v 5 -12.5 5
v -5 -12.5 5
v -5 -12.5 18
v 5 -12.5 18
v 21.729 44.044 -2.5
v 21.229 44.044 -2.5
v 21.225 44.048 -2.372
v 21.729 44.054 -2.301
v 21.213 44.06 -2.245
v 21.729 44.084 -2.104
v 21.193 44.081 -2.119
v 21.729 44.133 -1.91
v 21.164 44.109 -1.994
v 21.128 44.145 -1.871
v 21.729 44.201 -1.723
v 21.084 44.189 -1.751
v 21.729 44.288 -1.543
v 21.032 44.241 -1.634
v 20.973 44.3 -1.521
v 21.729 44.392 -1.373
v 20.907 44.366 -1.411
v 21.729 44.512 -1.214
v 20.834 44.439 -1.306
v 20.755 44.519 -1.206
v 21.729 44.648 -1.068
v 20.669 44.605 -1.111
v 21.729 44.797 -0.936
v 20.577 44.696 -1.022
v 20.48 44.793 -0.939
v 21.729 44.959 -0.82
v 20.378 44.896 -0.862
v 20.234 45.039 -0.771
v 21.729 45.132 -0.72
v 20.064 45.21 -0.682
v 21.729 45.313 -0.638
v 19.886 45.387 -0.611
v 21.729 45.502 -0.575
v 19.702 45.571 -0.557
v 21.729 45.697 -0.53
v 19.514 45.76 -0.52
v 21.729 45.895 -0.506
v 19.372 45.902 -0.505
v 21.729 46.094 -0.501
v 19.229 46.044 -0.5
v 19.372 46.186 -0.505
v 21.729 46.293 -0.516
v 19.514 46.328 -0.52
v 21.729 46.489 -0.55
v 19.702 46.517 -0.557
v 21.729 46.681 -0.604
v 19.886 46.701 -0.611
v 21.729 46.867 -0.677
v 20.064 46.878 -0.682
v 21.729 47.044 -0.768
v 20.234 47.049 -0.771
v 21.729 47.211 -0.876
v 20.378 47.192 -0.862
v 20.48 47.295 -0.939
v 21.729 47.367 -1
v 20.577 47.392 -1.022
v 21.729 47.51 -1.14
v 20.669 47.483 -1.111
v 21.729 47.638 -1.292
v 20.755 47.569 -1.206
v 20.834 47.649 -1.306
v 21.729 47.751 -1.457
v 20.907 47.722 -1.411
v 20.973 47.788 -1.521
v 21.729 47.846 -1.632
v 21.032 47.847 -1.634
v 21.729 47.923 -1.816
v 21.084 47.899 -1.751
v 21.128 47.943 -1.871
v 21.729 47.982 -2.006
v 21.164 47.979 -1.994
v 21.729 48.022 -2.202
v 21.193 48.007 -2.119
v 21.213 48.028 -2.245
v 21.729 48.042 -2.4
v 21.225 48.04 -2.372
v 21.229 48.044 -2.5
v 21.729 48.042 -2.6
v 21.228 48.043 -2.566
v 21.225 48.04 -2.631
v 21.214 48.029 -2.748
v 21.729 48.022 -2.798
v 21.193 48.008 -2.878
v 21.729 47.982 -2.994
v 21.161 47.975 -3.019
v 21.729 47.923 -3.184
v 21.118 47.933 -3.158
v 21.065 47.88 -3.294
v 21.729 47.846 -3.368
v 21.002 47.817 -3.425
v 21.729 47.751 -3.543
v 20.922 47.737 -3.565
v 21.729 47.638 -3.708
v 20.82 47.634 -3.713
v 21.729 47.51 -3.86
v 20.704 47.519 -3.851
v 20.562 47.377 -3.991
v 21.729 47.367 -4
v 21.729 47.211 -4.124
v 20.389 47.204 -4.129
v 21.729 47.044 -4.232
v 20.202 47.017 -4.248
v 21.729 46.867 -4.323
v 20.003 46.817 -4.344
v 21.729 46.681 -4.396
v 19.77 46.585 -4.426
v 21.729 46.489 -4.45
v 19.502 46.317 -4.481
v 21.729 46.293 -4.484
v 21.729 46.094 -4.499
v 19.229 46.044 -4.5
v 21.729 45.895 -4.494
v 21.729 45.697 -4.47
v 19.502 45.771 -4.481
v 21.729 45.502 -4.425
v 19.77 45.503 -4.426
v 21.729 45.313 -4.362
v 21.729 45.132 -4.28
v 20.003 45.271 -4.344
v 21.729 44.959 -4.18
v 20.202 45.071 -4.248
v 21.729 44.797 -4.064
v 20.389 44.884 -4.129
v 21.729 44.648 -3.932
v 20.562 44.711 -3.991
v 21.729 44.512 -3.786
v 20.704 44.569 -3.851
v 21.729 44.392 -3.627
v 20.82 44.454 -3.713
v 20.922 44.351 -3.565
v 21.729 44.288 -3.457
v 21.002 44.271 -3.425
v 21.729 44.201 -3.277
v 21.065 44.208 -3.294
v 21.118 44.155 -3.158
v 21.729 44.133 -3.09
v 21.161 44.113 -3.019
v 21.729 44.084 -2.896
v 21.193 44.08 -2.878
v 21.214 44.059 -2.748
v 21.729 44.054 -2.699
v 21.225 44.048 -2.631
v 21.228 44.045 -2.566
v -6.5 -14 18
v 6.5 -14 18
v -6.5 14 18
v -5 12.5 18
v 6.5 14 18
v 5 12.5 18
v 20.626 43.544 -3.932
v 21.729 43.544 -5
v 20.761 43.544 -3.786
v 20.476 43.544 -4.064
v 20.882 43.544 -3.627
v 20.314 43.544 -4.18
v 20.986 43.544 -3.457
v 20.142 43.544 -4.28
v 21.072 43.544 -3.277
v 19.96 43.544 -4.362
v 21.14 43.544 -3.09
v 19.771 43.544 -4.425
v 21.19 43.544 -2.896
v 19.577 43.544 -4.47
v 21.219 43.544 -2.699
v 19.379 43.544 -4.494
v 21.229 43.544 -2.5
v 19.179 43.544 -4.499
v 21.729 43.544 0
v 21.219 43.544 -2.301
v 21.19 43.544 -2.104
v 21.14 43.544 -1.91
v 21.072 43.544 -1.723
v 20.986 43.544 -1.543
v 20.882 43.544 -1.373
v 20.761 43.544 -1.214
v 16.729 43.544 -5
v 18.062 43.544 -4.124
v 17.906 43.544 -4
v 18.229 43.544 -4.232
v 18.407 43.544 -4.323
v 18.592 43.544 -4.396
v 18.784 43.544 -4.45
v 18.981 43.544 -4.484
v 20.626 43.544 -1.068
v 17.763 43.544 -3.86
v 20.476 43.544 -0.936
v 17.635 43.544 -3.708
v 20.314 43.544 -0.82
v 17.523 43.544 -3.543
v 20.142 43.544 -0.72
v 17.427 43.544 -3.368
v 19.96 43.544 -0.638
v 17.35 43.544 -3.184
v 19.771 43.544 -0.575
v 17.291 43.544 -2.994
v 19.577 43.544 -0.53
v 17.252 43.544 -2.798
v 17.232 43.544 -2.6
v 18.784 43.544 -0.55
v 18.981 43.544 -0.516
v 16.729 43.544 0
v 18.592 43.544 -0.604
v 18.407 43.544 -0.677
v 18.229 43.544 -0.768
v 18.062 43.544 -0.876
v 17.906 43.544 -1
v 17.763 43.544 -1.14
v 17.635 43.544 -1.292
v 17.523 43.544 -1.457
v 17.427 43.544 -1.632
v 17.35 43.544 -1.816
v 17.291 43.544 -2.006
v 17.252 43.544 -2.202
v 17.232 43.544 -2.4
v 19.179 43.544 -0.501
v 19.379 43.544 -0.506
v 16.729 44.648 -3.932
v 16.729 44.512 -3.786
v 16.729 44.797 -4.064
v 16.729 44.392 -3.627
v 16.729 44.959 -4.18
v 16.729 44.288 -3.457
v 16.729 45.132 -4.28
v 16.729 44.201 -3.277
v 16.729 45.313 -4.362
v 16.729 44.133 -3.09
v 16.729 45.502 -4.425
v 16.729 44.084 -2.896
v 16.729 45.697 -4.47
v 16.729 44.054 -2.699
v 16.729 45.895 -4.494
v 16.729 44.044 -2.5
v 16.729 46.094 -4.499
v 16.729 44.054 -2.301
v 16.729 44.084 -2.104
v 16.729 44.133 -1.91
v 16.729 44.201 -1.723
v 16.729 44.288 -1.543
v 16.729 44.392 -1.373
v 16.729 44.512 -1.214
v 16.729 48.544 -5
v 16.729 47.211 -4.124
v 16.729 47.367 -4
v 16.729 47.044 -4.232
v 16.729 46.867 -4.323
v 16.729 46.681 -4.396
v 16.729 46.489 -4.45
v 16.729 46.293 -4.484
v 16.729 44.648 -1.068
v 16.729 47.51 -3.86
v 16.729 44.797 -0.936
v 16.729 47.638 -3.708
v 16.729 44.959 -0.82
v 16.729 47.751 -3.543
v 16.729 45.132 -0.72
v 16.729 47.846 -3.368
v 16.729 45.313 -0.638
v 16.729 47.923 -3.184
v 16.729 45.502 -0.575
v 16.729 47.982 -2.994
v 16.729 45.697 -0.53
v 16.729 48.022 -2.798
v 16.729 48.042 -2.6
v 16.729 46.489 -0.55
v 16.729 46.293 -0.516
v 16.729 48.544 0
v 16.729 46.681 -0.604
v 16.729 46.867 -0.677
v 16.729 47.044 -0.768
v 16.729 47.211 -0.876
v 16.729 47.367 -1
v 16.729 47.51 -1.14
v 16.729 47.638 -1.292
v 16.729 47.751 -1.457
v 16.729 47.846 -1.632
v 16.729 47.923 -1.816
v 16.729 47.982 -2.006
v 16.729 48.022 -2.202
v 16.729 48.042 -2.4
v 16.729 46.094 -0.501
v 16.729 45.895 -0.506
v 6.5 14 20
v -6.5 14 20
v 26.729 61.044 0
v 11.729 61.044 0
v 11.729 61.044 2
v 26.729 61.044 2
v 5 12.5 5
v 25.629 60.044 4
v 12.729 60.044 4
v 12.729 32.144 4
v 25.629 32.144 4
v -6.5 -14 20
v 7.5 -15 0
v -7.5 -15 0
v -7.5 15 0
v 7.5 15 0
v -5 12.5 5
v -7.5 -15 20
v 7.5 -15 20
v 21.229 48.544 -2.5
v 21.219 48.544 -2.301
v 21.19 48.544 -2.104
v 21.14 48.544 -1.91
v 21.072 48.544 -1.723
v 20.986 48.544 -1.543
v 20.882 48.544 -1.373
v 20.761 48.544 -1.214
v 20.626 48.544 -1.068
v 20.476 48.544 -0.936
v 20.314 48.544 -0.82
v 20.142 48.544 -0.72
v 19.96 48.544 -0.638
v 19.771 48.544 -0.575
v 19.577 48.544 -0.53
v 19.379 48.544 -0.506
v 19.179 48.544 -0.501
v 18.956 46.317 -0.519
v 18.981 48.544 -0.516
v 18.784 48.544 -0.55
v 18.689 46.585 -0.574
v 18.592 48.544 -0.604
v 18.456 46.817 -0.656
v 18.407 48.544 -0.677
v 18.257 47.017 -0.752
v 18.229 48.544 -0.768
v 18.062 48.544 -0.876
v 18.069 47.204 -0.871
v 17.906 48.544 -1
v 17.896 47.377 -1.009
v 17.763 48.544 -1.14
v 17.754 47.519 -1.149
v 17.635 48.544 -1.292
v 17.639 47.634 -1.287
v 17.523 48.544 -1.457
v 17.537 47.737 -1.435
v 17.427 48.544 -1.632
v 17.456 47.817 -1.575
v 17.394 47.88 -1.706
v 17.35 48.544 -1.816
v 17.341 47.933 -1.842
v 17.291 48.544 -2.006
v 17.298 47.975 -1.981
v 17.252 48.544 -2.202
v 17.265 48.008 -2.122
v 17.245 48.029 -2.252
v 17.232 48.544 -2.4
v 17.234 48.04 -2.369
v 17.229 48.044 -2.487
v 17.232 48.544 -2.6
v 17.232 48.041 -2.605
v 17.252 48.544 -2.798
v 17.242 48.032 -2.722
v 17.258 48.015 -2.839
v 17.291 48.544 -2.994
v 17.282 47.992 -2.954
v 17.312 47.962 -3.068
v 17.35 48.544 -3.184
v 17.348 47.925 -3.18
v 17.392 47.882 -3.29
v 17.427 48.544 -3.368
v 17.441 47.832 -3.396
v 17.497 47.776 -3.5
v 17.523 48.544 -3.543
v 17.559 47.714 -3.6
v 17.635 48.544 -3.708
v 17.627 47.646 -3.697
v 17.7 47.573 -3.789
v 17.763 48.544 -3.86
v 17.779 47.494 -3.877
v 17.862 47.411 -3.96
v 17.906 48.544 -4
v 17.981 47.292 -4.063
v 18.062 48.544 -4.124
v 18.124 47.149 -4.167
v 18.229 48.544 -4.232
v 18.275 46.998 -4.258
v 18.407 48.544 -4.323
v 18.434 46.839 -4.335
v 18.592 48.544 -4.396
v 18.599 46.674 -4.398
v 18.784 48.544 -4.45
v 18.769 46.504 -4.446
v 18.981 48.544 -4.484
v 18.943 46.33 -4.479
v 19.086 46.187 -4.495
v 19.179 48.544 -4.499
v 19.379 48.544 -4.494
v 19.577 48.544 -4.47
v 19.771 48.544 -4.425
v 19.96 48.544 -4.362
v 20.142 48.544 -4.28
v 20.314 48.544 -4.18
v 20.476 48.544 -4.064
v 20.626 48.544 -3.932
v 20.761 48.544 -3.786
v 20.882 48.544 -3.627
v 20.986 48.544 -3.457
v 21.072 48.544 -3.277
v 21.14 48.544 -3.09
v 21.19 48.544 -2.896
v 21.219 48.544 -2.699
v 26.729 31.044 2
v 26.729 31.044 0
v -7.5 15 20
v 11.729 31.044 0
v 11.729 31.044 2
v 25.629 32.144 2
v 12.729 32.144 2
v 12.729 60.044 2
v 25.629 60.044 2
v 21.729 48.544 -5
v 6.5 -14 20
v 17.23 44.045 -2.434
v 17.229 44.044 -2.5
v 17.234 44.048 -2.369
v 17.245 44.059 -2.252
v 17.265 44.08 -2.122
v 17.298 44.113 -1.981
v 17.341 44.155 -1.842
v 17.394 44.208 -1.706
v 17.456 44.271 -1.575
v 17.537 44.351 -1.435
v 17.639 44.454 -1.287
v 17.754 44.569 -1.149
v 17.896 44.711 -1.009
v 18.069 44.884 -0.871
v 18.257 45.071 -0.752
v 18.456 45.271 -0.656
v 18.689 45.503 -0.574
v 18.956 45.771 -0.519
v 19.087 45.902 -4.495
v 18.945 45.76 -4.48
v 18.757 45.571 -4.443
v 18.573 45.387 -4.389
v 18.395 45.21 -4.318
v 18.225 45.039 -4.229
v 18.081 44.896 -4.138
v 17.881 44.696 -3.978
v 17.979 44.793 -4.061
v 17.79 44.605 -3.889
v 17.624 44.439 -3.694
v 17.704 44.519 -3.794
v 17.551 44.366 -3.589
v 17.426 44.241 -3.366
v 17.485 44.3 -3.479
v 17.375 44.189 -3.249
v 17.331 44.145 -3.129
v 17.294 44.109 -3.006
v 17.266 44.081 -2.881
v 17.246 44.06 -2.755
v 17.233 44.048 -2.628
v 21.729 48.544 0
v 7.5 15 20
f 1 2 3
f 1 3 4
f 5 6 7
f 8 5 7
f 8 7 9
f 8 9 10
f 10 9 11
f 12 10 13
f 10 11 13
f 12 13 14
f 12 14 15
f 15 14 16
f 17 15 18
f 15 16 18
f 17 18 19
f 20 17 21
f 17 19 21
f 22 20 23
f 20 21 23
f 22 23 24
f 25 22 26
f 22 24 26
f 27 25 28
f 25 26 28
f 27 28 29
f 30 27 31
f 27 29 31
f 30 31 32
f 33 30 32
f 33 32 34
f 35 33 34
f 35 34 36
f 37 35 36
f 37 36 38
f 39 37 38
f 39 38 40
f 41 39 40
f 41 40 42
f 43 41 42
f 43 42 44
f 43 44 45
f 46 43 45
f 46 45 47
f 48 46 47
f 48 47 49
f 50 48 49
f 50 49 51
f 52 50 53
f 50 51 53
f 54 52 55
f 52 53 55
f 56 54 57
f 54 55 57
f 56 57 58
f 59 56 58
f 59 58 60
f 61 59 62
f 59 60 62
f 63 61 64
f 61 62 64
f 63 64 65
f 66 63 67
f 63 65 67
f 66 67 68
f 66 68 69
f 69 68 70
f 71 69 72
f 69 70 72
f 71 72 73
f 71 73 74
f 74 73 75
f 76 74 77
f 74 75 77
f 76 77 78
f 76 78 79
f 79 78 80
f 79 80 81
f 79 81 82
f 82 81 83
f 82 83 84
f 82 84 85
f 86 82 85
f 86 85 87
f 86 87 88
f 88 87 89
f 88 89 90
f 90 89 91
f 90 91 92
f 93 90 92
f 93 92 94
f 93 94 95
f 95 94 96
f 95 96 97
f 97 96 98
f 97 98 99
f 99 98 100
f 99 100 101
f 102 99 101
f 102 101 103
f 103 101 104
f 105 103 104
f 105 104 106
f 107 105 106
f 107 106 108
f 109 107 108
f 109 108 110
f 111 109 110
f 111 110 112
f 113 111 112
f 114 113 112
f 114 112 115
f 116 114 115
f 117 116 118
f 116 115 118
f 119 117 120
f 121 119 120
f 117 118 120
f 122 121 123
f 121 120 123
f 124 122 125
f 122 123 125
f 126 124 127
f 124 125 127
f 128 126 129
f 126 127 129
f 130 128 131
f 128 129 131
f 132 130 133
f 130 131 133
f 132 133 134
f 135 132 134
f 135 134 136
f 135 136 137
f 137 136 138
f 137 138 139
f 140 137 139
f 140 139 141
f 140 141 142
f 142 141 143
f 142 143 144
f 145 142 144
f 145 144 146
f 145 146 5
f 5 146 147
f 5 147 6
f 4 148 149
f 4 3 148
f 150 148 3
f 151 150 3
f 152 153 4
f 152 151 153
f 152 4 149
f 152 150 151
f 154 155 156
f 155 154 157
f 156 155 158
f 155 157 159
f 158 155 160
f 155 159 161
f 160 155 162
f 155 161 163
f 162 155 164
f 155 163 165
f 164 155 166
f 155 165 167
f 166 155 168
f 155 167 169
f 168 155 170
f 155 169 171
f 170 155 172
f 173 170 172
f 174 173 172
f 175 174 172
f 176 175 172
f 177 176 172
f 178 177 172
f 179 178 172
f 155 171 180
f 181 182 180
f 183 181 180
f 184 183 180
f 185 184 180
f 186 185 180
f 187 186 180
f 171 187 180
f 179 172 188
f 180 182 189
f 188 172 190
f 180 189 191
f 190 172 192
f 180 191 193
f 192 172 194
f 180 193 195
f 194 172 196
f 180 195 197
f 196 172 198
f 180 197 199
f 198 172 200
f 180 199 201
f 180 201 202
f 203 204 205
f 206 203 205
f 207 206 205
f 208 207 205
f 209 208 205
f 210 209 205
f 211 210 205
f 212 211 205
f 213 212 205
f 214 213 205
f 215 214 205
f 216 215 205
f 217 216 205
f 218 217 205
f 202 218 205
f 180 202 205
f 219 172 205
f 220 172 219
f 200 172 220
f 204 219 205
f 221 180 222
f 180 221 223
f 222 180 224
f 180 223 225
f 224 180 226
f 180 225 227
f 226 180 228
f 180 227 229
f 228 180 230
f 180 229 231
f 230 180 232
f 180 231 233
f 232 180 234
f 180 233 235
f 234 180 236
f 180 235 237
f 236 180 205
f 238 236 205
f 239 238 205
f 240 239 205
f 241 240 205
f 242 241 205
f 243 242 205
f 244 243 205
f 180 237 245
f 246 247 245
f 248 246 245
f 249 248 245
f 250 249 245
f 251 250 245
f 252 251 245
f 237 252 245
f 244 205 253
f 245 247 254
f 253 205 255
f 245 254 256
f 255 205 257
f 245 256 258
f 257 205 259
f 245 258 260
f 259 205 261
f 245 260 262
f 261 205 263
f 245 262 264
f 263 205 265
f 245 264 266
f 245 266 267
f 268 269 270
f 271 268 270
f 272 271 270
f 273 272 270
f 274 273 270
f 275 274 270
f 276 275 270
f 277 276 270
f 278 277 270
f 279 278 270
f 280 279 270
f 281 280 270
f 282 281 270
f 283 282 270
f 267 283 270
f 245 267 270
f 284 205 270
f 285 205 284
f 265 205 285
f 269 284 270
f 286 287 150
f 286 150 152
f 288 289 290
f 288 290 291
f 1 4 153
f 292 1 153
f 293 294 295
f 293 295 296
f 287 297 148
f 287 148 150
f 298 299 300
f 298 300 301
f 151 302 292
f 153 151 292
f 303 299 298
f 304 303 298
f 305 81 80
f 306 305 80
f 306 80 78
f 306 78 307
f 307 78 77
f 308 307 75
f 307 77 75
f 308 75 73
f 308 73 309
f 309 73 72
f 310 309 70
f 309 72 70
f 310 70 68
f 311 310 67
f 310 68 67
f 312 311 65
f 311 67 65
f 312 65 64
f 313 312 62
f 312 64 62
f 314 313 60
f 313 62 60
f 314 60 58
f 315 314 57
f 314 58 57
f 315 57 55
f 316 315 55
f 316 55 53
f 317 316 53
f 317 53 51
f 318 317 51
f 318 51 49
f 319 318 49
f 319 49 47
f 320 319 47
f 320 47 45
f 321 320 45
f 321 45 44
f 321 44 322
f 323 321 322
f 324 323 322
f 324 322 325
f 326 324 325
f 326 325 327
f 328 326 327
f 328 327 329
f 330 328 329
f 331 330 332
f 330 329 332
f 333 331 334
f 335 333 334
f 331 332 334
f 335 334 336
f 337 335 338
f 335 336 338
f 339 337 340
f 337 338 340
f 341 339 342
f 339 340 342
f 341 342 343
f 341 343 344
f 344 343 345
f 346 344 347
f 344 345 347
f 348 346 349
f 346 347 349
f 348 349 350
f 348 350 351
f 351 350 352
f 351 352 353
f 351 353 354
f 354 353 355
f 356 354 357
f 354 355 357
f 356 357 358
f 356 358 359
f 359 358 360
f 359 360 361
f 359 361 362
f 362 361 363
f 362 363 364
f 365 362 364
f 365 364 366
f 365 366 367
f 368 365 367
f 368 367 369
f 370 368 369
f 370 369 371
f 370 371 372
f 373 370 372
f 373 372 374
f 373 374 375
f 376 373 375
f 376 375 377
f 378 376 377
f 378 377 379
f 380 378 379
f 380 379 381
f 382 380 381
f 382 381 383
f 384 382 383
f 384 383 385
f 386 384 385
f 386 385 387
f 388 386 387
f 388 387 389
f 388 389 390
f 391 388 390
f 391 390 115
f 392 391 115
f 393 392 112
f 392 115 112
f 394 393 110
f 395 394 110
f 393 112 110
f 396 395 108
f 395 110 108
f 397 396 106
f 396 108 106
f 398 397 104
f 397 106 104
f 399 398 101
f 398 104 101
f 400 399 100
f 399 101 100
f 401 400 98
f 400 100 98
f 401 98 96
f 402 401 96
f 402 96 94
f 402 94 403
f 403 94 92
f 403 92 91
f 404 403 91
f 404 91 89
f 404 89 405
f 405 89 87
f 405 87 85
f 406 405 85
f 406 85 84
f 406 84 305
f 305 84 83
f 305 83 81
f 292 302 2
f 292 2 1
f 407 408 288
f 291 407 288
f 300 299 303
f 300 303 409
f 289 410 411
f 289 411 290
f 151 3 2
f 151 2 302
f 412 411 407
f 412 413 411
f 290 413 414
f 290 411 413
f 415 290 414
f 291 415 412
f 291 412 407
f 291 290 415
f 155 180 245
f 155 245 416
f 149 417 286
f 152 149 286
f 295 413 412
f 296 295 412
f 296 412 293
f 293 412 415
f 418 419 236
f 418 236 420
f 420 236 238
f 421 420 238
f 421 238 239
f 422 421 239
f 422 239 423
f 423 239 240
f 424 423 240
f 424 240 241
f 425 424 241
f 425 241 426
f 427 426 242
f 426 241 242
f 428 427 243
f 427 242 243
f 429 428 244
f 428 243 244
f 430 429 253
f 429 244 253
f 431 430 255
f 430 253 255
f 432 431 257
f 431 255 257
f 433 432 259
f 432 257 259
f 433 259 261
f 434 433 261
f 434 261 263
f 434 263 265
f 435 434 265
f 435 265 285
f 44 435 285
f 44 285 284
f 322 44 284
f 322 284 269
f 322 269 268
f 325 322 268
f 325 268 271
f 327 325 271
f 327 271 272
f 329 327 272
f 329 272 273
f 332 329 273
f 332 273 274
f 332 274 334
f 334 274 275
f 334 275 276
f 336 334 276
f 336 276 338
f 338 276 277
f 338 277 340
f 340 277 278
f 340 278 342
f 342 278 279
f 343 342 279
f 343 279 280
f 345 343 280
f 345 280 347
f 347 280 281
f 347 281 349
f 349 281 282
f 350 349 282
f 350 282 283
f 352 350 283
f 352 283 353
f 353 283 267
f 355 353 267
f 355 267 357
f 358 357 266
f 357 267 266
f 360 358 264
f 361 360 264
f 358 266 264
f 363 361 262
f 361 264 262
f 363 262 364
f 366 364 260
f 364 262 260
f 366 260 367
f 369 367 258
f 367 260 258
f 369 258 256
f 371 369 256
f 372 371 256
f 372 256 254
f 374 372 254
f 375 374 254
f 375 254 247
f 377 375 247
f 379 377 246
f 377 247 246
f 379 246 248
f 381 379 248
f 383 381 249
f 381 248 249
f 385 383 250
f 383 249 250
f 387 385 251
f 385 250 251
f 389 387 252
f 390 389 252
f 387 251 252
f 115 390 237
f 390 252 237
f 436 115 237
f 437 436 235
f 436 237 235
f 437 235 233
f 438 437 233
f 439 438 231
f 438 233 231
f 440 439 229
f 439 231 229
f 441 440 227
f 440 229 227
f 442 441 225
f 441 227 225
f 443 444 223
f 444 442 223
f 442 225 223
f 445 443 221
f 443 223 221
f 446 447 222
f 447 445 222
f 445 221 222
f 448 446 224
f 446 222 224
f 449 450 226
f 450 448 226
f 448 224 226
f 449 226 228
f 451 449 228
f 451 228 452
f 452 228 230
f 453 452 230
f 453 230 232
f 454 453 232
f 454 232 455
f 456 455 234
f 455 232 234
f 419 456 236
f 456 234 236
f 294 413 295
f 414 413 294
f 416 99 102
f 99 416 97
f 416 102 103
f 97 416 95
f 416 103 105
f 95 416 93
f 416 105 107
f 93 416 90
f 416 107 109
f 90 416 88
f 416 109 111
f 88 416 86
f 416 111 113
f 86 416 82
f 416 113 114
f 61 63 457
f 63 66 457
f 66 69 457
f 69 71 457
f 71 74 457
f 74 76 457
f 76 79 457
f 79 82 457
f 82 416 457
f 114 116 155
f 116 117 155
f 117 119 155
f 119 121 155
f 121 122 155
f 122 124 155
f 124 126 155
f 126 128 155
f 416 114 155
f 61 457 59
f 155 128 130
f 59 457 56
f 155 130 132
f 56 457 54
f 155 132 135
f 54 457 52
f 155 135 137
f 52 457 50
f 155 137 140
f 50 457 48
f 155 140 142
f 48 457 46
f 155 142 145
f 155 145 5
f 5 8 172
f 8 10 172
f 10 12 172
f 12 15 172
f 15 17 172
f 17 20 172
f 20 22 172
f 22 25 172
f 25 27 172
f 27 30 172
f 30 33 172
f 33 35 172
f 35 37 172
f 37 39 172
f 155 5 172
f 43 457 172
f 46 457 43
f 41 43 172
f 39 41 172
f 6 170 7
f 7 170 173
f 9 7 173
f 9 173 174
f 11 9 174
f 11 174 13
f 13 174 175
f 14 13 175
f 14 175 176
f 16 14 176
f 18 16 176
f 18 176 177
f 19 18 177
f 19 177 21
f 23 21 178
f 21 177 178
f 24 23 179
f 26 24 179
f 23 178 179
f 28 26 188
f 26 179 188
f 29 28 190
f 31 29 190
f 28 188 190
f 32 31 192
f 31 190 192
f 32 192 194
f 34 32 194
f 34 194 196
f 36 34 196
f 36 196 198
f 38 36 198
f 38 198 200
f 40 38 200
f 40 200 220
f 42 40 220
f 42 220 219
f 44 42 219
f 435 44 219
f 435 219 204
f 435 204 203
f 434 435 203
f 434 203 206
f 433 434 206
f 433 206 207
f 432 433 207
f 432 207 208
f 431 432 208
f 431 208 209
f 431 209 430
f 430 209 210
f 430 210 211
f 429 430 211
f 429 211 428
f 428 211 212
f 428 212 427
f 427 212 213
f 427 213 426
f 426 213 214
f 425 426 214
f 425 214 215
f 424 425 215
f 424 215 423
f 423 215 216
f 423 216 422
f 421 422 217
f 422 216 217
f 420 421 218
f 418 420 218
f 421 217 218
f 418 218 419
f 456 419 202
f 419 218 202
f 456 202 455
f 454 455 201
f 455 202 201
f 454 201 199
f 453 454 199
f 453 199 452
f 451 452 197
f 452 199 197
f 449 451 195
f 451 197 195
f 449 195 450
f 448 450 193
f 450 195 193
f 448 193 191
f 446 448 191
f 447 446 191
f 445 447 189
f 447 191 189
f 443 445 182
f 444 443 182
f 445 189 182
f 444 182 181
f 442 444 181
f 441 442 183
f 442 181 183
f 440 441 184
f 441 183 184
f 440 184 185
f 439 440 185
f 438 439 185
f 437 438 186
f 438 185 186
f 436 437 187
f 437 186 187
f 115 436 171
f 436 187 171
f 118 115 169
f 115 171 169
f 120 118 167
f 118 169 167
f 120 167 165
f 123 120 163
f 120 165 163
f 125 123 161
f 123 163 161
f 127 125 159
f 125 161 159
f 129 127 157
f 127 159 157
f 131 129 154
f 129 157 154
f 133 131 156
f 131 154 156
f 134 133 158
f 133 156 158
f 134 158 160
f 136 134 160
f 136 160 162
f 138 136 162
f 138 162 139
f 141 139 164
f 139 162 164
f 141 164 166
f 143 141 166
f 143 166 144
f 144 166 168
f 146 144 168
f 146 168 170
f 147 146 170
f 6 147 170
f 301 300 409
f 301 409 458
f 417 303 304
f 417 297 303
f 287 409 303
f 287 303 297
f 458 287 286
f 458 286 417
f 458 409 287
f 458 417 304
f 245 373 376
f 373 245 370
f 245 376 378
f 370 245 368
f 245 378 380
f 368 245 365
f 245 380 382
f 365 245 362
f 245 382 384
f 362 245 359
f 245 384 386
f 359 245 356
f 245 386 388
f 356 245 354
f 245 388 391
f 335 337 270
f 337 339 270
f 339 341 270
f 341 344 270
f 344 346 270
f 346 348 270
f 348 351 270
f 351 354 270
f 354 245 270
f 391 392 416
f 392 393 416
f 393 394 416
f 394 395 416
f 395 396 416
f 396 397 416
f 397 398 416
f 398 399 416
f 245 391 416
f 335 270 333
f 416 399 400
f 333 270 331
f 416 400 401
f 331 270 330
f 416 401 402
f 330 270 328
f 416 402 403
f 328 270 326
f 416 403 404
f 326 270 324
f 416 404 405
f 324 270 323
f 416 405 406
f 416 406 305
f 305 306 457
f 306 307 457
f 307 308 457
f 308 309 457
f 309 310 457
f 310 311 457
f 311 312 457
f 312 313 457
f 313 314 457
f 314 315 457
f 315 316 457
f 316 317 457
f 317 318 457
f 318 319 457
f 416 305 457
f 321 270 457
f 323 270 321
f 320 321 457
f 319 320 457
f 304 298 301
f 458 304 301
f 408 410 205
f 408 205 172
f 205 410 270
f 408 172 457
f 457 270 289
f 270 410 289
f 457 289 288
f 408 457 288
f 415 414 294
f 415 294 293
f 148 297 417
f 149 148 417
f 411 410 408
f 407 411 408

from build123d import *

# Parameters (mm, degrees)
F0_W      = 15
F0_H      = 30
F1_DEPTH  = 20
F2_W      = 10
F2_H      = 25
F3_DEPTH  = 15
F4_W      = 13
F4_H      = 28
F5_DEPTH  = 2
F6_W      = 15
F6_H      = 30
F6_W_2    = 12.9
F6_H_2    = 27.9
F7_DEPTH  = 2
F8_DEPTH  = 4
F10_DEPTH = 5
F12_D     = 4
F14_D     = 4


with BuildPart() as f1:
    # F0 (on Top) → F1 (new body)
    with BuildSketch(Plane.XY):
        Rectangle(F0_W, F0_H)
    extrude(amount=F1_DEPTH)

    # F2 (on face) → F3 (cut)
    with BuildSketch(Plane.XY.offset(20)):
        Rectangle(F2_W, F2_H)
    extrude(amount=-F3_DEPTH, mode=Mode.SUBTRACT)

    # F4 (on face) → F5 (cut)
    with BuildSketch(Plane.XY.offset(20)):
        Rectangle(F4_W, F4_H)
    extrude(amount=-F5_DEPTH, mode=Mode.SUBTRACT)


with BuildPart() as f7:
    # F6 (on Top) → F7 (new body)
    with BuildSketch(Plane.XY):
        with Locations((19.229269, 46.044001)):
            Rectangle(F6_W, F6_H)
        with Locations((19.179269, 46.094001)):
            Rectangle(F6_W_2, F6_H_2, mode=Mode.SUBTRACT)
        with Locations((19.179269, 46.094001)):
            Rectangle(F6_W_2, F6_H_2)
    extrude(amount=F7_DEPTH)

    # F6 (on Top) → F8 (join)
    with BuildSketch(Plane.XY):
        with Locations((19.179269, 46.094001)):
            Rectangle(F6_W_2, F6_H_2)
    extrude(amount=F8_DEPTH)

    # F9 (on face) → F10 (join)
    with BuildSketch(Plane(origin=(0, 0, 0), x_dir=(1, 0, 0), z_dir=(0, 0, -1))):
        Polygon((20.479269, -43.544001), (17.979269, -43.544001), (19.229269, -46.044001), align=None)
        Polygon((19.229269, -46.044001), (17.979269, -43.544001), (16.729269, -43.544001), (16.729269, -48.544001), (17.979269, -48.544001), align=None)
        Polygon((20.479269, -43.544001), (19.229269, -46.044001), (20.479269, -48.544001), (21.729269, -48.544001), (21.729269, -43.544001), align=None)
        Polygon((20.479269, -48.544001), (19.229269, -46.044001), (17.979269, -48.544001), align=None)
    extrude(amount=F10_DEPTH)

    # F12 (through all)
    with Locations(Plane(origin=(0, 48.544001, 0), x_dir=(-1, 0, 0), z_dir=(0, 1, 0))):
        with Locations((-19.229269, -2.5)):
            Hole(F12_D / 2)

    # F14 (through all)
    with Locations(Plane.YZ.offset(21.729269)):
        with Locations((46.044001, -2.5)):
            Hole(F14_D / 2)


solid = Compound([f1.part, f7.part])
